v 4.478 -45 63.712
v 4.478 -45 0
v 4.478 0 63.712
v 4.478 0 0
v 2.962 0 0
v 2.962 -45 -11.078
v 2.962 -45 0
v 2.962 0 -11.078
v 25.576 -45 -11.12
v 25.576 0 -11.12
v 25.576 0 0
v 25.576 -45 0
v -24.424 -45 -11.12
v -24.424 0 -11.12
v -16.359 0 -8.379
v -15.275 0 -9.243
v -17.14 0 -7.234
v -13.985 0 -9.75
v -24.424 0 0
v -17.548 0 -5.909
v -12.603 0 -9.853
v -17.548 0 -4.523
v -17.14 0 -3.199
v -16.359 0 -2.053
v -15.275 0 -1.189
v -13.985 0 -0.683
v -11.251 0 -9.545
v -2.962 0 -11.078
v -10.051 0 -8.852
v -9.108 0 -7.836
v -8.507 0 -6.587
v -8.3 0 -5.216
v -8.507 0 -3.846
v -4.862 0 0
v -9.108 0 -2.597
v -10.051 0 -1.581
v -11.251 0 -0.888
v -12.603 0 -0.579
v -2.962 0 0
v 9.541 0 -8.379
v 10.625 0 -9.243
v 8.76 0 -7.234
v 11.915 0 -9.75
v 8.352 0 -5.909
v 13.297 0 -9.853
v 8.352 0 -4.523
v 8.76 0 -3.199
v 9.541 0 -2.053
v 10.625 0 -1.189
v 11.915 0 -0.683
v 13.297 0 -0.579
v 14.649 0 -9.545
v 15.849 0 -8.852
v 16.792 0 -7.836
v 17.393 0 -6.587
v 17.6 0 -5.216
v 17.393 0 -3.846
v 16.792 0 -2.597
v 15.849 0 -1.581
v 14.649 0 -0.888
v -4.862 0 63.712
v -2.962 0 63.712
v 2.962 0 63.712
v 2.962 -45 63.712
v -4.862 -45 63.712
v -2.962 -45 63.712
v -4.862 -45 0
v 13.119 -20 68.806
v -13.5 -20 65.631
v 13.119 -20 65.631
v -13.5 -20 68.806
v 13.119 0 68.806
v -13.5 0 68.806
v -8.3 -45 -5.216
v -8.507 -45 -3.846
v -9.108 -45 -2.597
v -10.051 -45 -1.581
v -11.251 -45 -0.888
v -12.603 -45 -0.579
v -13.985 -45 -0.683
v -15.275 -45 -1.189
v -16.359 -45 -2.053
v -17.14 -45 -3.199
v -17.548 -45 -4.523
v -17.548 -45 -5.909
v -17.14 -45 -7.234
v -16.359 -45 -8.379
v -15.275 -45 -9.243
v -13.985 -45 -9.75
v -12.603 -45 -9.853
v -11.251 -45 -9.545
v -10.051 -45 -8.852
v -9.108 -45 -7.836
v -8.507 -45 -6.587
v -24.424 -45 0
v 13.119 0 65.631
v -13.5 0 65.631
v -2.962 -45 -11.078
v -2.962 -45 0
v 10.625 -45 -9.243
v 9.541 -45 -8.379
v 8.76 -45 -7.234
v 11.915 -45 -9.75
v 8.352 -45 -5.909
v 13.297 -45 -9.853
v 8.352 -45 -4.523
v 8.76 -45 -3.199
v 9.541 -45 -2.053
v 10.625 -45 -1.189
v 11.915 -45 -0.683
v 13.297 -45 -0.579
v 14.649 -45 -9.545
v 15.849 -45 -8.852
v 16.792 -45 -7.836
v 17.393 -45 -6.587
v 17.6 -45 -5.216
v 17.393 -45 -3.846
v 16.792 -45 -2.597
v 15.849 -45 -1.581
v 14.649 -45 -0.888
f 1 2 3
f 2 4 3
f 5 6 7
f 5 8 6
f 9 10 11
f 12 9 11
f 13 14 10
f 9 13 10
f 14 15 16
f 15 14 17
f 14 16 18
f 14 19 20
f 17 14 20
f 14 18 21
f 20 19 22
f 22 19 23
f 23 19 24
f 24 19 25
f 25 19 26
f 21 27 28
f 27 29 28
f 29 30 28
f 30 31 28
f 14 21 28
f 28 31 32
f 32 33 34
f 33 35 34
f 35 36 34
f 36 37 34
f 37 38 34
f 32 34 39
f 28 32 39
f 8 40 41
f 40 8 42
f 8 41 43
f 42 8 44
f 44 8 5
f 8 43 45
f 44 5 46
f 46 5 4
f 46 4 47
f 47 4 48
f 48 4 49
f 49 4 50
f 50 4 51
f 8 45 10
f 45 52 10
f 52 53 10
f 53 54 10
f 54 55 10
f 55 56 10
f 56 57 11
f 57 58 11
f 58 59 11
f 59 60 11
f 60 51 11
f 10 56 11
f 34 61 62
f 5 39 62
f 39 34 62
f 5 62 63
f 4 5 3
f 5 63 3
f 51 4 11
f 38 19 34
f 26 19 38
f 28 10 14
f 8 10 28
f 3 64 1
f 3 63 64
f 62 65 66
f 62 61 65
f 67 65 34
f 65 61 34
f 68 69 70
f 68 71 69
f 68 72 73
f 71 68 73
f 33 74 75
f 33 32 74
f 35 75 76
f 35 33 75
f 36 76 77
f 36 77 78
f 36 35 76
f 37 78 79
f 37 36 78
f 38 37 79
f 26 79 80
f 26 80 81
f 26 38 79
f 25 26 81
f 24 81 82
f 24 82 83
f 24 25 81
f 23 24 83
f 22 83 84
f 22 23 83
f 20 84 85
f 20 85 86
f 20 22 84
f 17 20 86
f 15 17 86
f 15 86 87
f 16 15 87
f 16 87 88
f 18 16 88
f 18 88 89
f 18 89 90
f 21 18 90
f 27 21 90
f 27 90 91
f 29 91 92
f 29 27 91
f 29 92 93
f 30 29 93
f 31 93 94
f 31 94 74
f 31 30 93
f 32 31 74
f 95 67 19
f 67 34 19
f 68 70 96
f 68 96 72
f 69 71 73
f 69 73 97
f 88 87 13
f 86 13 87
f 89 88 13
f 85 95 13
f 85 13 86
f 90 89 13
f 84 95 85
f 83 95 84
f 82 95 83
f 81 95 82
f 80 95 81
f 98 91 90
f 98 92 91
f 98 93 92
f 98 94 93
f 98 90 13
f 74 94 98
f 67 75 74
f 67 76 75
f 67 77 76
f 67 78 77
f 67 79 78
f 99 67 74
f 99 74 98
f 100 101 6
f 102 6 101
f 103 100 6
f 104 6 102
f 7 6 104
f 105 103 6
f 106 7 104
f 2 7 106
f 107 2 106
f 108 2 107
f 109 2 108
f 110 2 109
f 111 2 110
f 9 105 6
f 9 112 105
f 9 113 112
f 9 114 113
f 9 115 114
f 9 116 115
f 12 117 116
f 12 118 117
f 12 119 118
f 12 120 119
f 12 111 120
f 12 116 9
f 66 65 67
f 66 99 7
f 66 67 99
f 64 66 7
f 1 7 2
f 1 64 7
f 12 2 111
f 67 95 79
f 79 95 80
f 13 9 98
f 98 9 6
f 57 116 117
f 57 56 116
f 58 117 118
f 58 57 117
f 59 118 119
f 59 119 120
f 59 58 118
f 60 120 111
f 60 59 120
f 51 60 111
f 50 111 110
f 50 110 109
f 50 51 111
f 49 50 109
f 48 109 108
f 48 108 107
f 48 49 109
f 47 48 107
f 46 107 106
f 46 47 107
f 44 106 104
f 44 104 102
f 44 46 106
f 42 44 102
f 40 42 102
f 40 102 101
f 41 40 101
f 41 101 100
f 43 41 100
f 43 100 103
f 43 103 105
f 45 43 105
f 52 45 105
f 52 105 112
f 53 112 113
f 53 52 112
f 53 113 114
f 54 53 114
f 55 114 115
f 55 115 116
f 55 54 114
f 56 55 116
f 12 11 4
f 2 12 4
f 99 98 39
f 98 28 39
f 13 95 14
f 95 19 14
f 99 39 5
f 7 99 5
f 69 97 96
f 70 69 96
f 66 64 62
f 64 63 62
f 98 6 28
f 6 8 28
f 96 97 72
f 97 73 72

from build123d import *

# Parameters (mm, degrees)
F0_W     = 1.9
F0_H     = 63.7123174495
F0_H_2   = 11.0776825505
F0_R     = 4.65
F0_W_2   = 3.1124644447
F0_H_3   = 4.9596726424
F0_W_3   = 1.5162971947
F1_DEPTH = 20
F2_DEPTH = 25


with BuildPart() as f1:
    # F0 (on Front) → F1 (new body)
    with BuildSketch(Plane.XZ):
        with Locations((-3.9118514026, 31.8561587247)):
            Rectangle(F0_W, F0_H)
        Polygon((-1.5797154047, 63.7123174495), (-2.9618514026, 63.7123174495), (-2.9618514026, 0), (2.9618514026, 0), (2.9618514026, 63.7123174495), (2.3623339366, 63.7123174495), (1.5327490401, 63.7123174495), (1.5327490401, 58.7526448071), (-1.5797154047, 58.7526448071), align=None)
        with Locations((-3.9118514026, -5.5388412753)):
            Rectangle(F0_W, F0_H_2)
        Polygon((-4.8618514026, -11.0776825505), (-4.8618514026, 0), (-24.4243843481, 0), (-24.4243843481, -11.1197736114), (25.5756156519, -11.1197736114), (25.5756156519, 0), (4.4781485974, 0), (4.4781485974, -11.0776825505), (2.9618514026, -11.0776825505), (-2.9618514026, -11.0776825505), align=None)
        with Locations((-12.95, -5.2161915228)):
            Circle(F0_R, mode=Mode.SUBTRACT)
        with Locations((12.95, -5.2161915228)):
            Circle(F0_R, mode=Mode.SUBTRACT)
        with Locations((-0.0234831823, 61.2324811283)):
            Rectangle(F0_W_2, F0_H_3)
        with Locations((3.72, 31.8561587247)):
            Rectangle(F0_W_3, F0_H)
        with Locations((3.72, -5.5388412753)):
            Rectangle(F0_W_3, F0_H_2)
    extrude(amount=F1_DEPTH)

    # F2 (add): a face of the model
    f2_faces = [f1.faces().sort_by_distance(p)[0] for p in [
        (0.2168007051, -20, 17.8369236317),
    ]]
    extrude(f2_faces, amount=F2_DEPTH)


with BuildPart() as f1b:
    # F0 (on Front) → F1, piece 2 (new body)
    with BuildSketch(Plane.XZ):
        Polygon((-13.5003169999, 65.6306147575), (-6.70787015, 65.6306147575), (-6.727591731, 65.6511085125), (-6.727591731, 68.806245923), (-13.5003169999, 68.806245923), align=None)
        Polygon((-6.727591731, 65.6511085125), (-6.70787015, 65.6306147575), (6.70787015, 65.6306147575), (6.727591731, 65.6511085125), (6.727591731, 68.806245923), (-6.727591731, 68.806245923), align=None)
        Polygon((6.727591731, 65.6511085125), (6.70787015, 65.6306147575), (13.1187578663, 65.6306147575), (13.1187578663, 68.806245923), (6.727591731, 68.806245923), align=None)
    extrude(amount=F1_DEPTH)


solid = Compound([f1.part, f1b.part])
